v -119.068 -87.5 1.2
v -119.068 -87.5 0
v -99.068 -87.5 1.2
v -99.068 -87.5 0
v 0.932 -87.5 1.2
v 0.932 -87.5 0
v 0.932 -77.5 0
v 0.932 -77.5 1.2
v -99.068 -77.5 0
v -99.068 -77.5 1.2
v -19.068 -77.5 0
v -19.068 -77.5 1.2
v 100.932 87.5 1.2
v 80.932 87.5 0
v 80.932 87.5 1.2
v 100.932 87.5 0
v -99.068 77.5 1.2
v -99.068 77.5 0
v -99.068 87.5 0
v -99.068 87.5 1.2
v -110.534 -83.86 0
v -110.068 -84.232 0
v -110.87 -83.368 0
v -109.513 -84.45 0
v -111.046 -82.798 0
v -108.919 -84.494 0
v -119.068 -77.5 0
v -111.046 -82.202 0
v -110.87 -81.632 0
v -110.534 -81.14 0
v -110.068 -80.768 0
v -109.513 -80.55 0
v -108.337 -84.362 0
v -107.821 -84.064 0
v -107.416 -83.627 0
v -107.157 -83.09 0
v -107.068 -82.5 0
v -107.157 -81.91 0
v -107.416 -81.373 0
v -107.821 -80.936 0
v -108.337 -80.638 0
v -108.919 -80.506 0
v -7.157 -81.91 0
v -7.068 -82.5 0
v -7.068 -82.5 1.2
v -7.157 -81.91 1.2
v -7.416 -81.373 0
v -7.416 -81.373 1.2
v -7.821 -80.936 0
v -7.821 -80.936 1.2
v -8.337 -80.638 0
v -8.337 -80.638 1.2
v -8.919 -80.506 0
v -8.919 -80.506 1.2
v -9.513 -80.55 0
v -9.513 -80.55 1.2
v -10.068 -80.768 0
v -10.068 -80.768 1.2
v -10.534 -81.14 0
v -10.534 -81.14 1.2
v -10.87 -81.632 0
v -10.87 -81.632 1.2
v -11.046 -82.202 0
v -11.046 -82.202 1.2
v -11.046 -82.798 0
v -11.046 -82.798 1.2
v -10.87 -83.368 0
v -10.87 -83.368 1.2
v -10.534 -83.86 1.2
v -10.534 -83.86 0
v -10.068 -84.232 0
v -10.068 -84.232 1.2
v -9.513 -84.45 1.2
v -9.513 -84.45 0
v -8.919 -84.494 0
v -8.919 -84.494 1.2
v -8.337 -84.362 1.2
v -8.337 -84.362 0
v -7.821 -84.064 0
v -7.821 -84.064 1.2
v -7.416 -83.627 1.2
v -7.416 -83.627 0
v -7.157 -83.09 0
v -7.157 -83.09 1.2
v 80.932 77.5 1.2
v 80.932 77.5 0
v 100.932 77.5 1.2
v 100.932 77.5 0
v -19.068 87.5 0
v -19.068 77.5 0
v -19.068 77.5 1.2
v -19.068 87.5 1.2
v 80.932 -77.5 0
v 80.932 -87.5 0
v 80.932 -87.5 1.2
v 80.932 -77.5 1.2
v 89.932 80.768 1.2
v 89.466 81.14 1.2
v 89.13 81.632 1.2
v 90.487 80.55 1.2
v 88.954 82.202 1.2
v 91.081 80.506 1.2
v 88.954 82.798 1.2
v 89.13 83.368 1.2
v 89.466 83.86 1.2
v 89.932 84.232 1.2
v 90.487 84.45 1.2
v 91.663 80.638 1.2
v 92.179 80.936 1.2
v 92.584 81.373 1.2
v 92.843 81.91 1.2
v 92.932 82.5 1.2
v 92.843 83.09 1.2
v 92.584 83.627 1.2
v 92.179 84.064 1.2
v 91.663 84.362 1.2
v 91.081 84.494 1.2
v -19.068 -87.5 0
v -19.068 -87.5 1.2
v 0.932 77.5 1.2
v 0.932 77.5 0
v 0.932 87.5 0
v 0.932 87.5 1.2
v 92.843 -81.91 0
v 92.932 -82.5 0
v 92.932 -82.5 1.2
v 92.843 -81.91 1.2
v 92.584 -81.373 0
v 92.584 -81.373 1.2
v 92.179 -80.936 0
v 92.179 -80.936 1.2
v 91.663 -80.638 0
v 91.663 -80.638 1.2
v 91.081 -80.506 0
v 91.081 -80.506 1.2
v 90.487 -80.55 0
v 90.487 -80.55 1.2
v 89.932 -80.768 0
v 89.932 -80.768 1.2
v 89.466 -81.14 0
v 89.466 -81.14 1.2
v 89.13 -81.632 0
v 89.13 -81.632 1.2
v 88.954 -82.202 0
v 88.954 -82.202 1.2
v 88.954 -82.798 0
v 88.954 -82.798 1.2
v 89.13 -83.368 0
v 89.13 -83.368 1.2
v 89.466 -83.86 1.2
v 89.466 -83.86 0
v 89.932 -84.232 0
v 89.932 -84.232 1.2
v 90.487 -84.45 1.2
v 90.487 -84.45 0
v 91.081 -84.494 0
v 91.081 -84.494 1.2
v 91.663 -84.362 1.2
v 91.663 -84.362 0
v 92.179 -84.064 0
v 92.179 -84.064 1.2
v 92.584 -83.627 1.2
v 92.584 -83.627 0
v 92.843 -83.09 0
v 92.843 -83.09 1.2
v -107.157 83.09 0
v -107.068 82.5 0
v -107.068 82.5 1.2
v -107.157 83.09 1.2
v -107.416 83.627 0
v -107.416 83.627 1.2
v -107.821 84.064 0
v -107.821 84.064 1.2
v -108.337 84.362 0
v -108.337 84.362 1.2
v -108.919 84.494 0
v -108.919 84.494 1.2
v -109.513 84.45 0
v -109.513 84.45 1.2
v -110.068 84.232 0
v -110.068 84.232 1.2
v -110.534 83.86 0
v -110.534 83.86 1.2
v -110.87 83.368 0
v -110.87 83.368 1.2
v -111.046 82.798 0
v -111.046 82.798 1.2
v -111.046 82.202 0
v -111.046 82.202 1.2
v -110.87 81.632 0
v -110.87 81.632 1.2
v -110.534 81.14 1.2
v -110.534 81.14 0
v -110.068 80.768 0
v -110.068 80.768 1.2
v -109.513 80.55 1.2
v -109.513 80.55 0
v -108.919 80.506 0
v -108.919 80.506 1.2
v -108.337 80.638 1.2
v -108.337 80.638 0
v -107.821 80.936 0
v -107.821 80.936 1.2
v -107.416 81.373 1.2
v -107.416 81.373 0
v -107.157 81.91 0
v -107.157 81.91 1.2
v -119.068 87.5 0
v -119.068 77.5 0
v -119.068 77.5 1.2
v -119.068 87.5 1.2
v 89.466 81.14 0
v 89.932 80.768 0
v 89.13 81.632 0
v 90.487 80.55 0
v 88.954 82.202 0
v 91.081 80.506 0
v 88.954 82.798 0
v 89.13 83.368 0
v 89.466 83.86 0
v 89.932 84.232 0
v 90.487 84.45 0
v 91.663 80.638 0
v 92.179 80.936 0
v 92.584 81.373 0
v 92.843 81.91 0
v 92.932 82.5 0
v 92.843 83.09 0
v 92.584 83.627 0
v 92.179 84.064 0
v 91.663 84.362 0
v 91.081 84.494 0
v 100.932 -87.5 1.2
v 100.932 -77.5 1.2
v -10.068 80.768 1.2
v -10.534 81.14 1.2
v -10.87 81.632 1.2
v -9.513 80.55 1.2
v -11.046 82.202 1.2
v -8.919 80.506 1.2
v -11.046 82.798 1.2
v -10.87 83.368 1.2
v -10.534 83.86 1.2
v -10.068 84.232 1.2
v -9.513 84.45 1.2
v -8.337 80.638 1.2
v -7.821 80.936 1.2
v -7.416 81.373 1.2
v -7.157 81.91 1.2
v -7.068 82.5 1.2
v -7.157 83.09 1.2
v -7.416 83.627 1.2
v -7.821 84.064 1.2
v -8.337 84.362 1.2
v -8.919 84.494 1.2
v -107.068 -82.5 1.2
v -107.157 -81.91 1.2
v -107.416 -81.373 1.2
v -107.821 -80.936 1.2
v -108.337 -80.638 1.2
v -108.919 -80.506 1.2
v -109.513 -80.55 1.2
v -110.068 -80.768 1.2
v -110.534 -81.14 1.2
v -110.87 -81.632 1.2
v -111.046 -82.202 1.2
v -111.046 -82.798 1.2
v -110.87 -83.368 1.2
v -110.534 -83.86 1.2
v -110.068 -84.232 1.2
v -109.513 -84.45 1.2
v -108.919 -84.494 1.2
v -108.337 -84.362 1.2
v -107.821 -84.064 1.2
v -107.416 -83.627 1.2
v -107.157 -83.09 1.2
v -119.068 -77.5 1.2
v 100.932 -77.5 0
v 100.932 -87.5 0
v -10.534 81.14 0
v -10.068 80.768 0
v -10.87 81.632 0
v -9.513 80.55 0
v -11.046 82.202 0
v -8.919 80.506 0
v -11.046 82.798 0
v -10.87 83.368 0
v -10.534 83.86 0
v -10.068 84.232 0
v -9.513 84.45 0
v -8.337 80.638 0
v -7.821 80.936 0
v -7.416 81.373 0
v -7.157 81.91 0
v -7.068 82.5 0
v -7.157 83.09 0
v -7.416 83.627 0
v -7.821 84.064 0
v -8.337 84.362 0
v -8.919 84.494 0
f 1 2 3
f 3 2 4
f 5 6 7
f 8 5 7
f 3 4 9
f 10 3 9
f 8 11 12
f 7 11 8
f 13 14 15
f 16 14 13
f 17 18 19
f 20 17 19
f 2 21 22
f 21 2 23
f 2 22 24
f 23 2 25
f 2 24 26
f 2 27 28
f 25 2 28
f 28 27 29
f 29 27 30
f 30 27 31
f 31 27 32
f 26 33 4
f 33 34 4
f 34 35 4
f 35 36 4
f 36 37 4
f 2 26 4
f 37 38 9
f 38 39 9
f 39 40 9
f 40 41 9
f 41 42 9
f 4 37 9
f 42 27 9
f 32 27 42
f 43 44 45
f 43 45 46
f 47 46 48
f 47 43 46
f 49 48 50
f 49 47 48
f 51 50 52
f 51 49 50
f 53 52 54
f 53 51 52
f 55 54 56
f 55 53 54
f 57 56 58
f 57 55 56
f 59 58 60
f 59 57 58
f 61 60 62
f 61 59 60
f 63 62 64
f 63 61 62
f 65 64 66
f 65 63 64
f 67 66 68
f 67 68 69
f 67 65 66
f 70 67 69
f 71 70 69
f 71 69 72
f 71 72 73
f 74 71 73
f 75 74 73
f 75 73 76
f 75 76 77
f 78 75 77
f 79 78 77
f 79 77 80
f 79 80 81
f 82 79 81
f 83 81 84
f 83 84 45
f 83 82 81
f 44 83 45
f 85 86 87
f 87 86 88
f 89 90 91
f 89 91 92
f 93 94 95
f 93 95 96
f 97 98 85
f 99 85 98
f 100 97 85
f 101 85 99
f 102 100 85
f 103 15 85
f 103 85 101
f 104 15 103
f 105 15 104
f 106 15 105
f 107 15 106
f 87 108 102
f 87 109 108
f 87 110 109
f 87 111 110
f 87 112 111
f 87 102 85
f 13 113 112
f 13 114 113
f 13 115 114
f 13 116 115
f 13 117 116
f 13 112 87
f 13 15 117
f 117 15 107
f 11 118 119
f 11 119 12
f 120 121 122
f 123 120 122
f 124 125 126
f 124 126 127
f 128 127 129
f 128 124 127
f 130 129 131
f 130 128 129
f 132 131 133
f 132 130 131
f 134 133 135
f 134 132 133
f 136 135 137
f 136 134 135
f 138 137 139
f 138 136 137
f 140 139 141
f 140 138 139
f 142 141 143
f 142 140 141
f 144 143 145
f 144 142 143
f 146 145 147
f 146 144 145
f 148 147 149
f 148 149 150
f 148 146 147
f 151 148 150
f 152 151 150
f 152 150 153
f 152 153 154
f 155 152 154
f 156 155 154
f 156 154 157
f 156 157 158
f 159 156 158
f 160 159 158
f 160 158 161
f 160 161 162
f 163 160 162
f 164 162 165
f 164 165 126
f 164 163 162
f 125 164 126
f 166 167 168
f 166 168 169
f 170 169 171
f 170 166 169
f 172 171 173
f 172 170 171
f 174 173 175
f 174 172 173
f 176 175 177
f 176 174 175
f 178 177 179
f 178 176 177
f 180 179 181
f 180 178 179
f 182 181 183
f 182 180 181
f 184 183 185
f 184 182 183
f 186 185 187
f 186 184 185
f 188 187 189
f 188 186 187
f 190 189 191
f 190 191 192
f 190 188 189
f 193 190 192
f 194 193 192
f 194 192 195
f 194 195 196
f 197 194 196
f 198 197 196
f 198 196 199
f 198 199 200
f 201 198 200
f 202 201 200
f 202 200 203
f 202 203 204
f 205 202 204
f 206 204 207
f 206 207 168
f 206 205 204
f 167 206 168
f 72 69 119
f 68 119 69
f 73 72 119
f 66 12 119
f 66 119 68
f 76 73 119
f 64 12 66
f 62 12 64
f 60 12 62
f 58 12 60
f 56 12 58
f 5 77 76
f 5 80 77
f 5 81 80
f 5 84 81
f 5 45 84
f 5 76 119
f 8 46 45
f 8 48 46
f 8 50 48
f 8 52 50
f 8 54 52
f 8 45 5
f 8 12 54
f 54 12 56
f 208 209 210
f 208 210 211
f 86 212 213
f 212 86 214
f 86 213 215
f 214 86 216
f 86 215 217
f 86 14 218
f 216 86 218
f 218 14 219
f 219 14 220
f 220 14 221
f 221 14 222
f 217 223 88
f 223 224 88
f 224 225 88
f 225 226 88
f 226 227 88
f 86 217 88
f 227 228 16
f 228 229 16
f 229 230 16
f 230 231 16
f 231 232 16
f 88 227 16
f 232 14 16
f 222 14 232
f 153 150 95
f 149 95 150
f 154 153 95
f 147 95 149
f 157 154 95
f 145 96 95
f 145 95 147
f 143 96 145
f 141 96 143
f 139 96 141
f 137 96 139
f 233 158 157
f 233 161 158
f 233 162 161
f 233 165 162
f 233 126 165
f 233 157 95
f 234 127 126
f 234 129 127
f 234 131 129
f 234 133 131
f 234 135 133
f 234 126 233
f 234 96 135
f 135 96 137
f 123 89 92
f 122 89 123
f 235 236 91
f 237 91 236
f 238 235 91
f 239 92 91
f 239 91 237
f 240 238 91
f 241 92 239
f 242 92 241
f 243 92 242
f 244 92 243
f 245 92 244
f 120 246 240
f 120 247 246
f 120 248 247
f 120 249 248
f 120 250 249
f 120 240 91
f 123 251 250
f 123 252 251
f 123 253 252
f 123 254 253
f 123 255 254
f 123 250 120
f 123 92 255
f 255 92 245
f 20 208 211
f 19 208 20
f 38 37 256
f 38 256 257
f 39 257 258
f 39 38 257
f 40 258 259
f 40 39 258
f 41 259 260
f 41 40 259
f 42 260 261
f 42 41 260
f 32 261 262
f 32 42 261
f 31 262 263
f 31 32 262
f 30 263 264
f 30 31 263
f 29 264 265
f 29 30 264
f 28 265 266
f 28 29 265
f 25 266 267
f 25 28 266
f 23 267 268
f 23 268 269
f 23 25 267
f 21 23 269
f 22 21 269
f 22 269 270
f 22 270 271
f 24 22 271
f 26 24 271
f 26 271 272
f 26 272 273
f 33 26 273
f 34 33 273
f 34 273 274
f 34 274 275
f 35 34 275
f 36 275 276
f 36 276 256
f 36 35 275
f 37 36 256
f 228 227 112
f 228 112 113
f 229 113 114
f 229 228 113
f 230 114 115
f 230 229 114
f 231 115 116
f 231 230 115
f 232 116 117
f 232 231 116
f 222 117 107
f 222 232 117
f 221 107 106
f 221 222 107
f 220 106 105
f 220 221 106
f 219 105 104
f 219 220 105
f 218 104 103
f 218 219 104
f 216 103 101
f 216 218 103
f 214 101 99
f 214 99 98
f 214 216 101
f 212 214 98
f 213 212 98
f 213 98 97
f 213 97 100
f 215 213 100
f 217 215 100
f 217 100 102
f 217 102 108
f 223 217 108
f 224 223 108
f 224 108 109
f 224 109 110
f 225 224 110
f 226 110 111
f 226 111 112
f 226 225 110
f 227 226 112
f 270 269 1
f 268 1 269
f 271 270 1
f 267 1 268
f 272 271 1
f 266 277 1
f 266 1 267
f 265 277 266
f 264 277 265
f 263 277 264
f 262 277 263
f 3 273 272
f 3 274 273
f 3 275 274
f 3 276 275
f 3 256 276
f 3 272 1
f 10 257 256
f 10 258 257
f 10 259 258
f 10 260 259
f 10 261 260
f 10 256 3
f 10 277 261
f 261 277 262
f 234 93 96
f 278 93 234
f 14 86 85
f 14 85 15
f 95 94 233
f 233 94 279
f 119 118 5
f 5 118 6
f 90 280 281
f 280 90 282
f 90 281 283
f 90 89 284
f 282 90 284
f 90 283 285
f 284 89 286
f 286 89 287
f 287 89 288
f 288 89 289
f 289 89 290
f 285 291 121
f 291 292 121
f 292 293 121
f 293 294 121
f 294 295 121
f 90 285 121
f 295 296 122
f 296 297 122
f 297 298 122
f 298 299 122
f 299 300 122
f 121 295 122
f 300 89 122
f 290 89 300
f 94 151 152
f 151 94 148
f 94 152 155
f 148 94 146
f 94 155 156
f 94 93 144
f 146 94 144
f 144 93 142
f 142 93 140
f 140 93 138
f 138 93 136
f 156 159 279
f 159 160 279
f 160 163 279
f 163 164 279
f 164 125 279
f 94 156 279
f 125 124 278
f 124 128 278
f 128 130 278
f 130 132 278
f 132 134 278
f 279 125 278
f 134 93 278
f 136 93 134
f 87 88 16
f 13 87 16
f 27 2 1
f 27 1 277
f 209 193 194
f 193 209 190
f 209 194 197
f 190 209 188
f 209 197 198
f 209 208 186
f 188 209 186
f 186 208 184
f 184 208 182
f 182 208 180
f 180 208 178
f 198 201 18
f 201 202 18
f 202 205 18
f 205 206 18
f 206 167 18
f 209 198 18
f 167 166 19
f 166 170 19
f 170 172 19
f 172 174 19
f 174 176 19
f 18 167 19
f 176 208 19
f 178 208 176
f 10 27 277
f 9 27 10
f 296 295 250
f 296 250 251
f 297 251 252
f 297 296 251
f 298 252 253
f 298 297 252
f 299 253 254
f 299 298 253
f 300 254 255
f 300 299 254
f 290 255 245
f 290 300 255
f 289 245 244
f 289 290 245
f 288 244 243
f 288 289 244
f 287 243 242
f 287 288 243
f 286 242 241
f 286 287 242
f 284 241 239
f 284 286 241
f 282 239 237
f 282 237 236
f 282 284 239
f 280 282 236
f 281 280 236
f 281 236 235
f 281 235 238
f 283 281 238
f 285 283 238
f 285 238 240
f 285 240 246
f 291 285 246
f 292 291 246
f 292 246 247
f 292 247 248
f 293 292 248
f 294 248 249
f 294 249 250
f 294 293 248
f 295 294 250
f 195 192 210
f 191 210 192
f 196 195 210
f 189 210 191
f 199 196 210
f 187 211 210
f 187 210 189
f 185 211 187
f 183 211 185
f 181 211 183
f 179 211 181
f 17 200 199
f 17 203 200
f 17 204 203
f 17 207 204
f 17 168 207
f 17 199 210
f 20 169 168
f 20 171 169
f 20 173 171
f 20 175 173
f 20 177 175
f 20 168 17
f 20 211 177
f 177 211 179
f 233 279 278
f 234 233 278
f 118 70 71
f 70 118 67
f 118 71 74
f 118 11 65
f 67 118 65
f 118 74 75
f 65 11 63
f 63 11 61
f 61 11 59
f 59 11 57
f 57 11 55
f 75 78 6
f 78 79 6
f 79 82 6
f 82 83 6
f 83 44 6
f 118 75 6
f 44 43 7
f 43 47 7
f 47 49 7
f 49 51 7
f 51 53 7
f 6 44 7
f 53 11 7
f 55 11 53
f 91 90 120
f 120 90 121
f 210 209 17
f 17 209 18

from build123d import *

# Parameters (mm, degrees)
F0_W     = 20
F0_H     = 10
F0_R     = 2
F1_DEPTH = 1.2


with BuildPart() as f1:
    # F0 (on Top) → F1 (new body)
    with BuildSketch(Plane.XY):
        with Locations((-109.068104, 82.5)):
            Rectangle(F0_W, F0_H)
        with Locations((-109.068104, 82.5)):
            Circle(F0_R, mode=Mode.SUBTRACT)
        with Locations((90.931896, 82.5)):
            Rectangle(F0_W, F0_H)
        with Locations((90.931896, 82.5)):
            Circle(F0_R, mode=Mode.SUBTRACT)
        with Locations((-9.068104, 82.5)):
            Rectangle(F0_W, F0_H)
        with Locations((-9.068104, 82.5)):
            Circle(F0_R, mode=Mode.SUBTRACT)
        with Locations((-109.068104, -82.5)):
            Rectangle(F0_W, F0_H)
        with Locations((-109.068104, -82.5)):
            Circle(F0_R, mode=Mode.SUBTRACT)
        with Locations((-9.068104, -82.5)):
            Rectangle(F0_W, F0_H)
        with Locations((-9.068104, -82.5)):
            Circle(F0_R, mode=Mode.SUBTRACT)
        with Locations((90.931896, -82.5)):
            Rectangle(F0_W, F0_H)
        with Locations((90.931896, -82.5)):
            Circle(F0_R, mode=Mode.SUBTRACT)
    extrude(amount=F1_DEPTH)


solid = f1.part
